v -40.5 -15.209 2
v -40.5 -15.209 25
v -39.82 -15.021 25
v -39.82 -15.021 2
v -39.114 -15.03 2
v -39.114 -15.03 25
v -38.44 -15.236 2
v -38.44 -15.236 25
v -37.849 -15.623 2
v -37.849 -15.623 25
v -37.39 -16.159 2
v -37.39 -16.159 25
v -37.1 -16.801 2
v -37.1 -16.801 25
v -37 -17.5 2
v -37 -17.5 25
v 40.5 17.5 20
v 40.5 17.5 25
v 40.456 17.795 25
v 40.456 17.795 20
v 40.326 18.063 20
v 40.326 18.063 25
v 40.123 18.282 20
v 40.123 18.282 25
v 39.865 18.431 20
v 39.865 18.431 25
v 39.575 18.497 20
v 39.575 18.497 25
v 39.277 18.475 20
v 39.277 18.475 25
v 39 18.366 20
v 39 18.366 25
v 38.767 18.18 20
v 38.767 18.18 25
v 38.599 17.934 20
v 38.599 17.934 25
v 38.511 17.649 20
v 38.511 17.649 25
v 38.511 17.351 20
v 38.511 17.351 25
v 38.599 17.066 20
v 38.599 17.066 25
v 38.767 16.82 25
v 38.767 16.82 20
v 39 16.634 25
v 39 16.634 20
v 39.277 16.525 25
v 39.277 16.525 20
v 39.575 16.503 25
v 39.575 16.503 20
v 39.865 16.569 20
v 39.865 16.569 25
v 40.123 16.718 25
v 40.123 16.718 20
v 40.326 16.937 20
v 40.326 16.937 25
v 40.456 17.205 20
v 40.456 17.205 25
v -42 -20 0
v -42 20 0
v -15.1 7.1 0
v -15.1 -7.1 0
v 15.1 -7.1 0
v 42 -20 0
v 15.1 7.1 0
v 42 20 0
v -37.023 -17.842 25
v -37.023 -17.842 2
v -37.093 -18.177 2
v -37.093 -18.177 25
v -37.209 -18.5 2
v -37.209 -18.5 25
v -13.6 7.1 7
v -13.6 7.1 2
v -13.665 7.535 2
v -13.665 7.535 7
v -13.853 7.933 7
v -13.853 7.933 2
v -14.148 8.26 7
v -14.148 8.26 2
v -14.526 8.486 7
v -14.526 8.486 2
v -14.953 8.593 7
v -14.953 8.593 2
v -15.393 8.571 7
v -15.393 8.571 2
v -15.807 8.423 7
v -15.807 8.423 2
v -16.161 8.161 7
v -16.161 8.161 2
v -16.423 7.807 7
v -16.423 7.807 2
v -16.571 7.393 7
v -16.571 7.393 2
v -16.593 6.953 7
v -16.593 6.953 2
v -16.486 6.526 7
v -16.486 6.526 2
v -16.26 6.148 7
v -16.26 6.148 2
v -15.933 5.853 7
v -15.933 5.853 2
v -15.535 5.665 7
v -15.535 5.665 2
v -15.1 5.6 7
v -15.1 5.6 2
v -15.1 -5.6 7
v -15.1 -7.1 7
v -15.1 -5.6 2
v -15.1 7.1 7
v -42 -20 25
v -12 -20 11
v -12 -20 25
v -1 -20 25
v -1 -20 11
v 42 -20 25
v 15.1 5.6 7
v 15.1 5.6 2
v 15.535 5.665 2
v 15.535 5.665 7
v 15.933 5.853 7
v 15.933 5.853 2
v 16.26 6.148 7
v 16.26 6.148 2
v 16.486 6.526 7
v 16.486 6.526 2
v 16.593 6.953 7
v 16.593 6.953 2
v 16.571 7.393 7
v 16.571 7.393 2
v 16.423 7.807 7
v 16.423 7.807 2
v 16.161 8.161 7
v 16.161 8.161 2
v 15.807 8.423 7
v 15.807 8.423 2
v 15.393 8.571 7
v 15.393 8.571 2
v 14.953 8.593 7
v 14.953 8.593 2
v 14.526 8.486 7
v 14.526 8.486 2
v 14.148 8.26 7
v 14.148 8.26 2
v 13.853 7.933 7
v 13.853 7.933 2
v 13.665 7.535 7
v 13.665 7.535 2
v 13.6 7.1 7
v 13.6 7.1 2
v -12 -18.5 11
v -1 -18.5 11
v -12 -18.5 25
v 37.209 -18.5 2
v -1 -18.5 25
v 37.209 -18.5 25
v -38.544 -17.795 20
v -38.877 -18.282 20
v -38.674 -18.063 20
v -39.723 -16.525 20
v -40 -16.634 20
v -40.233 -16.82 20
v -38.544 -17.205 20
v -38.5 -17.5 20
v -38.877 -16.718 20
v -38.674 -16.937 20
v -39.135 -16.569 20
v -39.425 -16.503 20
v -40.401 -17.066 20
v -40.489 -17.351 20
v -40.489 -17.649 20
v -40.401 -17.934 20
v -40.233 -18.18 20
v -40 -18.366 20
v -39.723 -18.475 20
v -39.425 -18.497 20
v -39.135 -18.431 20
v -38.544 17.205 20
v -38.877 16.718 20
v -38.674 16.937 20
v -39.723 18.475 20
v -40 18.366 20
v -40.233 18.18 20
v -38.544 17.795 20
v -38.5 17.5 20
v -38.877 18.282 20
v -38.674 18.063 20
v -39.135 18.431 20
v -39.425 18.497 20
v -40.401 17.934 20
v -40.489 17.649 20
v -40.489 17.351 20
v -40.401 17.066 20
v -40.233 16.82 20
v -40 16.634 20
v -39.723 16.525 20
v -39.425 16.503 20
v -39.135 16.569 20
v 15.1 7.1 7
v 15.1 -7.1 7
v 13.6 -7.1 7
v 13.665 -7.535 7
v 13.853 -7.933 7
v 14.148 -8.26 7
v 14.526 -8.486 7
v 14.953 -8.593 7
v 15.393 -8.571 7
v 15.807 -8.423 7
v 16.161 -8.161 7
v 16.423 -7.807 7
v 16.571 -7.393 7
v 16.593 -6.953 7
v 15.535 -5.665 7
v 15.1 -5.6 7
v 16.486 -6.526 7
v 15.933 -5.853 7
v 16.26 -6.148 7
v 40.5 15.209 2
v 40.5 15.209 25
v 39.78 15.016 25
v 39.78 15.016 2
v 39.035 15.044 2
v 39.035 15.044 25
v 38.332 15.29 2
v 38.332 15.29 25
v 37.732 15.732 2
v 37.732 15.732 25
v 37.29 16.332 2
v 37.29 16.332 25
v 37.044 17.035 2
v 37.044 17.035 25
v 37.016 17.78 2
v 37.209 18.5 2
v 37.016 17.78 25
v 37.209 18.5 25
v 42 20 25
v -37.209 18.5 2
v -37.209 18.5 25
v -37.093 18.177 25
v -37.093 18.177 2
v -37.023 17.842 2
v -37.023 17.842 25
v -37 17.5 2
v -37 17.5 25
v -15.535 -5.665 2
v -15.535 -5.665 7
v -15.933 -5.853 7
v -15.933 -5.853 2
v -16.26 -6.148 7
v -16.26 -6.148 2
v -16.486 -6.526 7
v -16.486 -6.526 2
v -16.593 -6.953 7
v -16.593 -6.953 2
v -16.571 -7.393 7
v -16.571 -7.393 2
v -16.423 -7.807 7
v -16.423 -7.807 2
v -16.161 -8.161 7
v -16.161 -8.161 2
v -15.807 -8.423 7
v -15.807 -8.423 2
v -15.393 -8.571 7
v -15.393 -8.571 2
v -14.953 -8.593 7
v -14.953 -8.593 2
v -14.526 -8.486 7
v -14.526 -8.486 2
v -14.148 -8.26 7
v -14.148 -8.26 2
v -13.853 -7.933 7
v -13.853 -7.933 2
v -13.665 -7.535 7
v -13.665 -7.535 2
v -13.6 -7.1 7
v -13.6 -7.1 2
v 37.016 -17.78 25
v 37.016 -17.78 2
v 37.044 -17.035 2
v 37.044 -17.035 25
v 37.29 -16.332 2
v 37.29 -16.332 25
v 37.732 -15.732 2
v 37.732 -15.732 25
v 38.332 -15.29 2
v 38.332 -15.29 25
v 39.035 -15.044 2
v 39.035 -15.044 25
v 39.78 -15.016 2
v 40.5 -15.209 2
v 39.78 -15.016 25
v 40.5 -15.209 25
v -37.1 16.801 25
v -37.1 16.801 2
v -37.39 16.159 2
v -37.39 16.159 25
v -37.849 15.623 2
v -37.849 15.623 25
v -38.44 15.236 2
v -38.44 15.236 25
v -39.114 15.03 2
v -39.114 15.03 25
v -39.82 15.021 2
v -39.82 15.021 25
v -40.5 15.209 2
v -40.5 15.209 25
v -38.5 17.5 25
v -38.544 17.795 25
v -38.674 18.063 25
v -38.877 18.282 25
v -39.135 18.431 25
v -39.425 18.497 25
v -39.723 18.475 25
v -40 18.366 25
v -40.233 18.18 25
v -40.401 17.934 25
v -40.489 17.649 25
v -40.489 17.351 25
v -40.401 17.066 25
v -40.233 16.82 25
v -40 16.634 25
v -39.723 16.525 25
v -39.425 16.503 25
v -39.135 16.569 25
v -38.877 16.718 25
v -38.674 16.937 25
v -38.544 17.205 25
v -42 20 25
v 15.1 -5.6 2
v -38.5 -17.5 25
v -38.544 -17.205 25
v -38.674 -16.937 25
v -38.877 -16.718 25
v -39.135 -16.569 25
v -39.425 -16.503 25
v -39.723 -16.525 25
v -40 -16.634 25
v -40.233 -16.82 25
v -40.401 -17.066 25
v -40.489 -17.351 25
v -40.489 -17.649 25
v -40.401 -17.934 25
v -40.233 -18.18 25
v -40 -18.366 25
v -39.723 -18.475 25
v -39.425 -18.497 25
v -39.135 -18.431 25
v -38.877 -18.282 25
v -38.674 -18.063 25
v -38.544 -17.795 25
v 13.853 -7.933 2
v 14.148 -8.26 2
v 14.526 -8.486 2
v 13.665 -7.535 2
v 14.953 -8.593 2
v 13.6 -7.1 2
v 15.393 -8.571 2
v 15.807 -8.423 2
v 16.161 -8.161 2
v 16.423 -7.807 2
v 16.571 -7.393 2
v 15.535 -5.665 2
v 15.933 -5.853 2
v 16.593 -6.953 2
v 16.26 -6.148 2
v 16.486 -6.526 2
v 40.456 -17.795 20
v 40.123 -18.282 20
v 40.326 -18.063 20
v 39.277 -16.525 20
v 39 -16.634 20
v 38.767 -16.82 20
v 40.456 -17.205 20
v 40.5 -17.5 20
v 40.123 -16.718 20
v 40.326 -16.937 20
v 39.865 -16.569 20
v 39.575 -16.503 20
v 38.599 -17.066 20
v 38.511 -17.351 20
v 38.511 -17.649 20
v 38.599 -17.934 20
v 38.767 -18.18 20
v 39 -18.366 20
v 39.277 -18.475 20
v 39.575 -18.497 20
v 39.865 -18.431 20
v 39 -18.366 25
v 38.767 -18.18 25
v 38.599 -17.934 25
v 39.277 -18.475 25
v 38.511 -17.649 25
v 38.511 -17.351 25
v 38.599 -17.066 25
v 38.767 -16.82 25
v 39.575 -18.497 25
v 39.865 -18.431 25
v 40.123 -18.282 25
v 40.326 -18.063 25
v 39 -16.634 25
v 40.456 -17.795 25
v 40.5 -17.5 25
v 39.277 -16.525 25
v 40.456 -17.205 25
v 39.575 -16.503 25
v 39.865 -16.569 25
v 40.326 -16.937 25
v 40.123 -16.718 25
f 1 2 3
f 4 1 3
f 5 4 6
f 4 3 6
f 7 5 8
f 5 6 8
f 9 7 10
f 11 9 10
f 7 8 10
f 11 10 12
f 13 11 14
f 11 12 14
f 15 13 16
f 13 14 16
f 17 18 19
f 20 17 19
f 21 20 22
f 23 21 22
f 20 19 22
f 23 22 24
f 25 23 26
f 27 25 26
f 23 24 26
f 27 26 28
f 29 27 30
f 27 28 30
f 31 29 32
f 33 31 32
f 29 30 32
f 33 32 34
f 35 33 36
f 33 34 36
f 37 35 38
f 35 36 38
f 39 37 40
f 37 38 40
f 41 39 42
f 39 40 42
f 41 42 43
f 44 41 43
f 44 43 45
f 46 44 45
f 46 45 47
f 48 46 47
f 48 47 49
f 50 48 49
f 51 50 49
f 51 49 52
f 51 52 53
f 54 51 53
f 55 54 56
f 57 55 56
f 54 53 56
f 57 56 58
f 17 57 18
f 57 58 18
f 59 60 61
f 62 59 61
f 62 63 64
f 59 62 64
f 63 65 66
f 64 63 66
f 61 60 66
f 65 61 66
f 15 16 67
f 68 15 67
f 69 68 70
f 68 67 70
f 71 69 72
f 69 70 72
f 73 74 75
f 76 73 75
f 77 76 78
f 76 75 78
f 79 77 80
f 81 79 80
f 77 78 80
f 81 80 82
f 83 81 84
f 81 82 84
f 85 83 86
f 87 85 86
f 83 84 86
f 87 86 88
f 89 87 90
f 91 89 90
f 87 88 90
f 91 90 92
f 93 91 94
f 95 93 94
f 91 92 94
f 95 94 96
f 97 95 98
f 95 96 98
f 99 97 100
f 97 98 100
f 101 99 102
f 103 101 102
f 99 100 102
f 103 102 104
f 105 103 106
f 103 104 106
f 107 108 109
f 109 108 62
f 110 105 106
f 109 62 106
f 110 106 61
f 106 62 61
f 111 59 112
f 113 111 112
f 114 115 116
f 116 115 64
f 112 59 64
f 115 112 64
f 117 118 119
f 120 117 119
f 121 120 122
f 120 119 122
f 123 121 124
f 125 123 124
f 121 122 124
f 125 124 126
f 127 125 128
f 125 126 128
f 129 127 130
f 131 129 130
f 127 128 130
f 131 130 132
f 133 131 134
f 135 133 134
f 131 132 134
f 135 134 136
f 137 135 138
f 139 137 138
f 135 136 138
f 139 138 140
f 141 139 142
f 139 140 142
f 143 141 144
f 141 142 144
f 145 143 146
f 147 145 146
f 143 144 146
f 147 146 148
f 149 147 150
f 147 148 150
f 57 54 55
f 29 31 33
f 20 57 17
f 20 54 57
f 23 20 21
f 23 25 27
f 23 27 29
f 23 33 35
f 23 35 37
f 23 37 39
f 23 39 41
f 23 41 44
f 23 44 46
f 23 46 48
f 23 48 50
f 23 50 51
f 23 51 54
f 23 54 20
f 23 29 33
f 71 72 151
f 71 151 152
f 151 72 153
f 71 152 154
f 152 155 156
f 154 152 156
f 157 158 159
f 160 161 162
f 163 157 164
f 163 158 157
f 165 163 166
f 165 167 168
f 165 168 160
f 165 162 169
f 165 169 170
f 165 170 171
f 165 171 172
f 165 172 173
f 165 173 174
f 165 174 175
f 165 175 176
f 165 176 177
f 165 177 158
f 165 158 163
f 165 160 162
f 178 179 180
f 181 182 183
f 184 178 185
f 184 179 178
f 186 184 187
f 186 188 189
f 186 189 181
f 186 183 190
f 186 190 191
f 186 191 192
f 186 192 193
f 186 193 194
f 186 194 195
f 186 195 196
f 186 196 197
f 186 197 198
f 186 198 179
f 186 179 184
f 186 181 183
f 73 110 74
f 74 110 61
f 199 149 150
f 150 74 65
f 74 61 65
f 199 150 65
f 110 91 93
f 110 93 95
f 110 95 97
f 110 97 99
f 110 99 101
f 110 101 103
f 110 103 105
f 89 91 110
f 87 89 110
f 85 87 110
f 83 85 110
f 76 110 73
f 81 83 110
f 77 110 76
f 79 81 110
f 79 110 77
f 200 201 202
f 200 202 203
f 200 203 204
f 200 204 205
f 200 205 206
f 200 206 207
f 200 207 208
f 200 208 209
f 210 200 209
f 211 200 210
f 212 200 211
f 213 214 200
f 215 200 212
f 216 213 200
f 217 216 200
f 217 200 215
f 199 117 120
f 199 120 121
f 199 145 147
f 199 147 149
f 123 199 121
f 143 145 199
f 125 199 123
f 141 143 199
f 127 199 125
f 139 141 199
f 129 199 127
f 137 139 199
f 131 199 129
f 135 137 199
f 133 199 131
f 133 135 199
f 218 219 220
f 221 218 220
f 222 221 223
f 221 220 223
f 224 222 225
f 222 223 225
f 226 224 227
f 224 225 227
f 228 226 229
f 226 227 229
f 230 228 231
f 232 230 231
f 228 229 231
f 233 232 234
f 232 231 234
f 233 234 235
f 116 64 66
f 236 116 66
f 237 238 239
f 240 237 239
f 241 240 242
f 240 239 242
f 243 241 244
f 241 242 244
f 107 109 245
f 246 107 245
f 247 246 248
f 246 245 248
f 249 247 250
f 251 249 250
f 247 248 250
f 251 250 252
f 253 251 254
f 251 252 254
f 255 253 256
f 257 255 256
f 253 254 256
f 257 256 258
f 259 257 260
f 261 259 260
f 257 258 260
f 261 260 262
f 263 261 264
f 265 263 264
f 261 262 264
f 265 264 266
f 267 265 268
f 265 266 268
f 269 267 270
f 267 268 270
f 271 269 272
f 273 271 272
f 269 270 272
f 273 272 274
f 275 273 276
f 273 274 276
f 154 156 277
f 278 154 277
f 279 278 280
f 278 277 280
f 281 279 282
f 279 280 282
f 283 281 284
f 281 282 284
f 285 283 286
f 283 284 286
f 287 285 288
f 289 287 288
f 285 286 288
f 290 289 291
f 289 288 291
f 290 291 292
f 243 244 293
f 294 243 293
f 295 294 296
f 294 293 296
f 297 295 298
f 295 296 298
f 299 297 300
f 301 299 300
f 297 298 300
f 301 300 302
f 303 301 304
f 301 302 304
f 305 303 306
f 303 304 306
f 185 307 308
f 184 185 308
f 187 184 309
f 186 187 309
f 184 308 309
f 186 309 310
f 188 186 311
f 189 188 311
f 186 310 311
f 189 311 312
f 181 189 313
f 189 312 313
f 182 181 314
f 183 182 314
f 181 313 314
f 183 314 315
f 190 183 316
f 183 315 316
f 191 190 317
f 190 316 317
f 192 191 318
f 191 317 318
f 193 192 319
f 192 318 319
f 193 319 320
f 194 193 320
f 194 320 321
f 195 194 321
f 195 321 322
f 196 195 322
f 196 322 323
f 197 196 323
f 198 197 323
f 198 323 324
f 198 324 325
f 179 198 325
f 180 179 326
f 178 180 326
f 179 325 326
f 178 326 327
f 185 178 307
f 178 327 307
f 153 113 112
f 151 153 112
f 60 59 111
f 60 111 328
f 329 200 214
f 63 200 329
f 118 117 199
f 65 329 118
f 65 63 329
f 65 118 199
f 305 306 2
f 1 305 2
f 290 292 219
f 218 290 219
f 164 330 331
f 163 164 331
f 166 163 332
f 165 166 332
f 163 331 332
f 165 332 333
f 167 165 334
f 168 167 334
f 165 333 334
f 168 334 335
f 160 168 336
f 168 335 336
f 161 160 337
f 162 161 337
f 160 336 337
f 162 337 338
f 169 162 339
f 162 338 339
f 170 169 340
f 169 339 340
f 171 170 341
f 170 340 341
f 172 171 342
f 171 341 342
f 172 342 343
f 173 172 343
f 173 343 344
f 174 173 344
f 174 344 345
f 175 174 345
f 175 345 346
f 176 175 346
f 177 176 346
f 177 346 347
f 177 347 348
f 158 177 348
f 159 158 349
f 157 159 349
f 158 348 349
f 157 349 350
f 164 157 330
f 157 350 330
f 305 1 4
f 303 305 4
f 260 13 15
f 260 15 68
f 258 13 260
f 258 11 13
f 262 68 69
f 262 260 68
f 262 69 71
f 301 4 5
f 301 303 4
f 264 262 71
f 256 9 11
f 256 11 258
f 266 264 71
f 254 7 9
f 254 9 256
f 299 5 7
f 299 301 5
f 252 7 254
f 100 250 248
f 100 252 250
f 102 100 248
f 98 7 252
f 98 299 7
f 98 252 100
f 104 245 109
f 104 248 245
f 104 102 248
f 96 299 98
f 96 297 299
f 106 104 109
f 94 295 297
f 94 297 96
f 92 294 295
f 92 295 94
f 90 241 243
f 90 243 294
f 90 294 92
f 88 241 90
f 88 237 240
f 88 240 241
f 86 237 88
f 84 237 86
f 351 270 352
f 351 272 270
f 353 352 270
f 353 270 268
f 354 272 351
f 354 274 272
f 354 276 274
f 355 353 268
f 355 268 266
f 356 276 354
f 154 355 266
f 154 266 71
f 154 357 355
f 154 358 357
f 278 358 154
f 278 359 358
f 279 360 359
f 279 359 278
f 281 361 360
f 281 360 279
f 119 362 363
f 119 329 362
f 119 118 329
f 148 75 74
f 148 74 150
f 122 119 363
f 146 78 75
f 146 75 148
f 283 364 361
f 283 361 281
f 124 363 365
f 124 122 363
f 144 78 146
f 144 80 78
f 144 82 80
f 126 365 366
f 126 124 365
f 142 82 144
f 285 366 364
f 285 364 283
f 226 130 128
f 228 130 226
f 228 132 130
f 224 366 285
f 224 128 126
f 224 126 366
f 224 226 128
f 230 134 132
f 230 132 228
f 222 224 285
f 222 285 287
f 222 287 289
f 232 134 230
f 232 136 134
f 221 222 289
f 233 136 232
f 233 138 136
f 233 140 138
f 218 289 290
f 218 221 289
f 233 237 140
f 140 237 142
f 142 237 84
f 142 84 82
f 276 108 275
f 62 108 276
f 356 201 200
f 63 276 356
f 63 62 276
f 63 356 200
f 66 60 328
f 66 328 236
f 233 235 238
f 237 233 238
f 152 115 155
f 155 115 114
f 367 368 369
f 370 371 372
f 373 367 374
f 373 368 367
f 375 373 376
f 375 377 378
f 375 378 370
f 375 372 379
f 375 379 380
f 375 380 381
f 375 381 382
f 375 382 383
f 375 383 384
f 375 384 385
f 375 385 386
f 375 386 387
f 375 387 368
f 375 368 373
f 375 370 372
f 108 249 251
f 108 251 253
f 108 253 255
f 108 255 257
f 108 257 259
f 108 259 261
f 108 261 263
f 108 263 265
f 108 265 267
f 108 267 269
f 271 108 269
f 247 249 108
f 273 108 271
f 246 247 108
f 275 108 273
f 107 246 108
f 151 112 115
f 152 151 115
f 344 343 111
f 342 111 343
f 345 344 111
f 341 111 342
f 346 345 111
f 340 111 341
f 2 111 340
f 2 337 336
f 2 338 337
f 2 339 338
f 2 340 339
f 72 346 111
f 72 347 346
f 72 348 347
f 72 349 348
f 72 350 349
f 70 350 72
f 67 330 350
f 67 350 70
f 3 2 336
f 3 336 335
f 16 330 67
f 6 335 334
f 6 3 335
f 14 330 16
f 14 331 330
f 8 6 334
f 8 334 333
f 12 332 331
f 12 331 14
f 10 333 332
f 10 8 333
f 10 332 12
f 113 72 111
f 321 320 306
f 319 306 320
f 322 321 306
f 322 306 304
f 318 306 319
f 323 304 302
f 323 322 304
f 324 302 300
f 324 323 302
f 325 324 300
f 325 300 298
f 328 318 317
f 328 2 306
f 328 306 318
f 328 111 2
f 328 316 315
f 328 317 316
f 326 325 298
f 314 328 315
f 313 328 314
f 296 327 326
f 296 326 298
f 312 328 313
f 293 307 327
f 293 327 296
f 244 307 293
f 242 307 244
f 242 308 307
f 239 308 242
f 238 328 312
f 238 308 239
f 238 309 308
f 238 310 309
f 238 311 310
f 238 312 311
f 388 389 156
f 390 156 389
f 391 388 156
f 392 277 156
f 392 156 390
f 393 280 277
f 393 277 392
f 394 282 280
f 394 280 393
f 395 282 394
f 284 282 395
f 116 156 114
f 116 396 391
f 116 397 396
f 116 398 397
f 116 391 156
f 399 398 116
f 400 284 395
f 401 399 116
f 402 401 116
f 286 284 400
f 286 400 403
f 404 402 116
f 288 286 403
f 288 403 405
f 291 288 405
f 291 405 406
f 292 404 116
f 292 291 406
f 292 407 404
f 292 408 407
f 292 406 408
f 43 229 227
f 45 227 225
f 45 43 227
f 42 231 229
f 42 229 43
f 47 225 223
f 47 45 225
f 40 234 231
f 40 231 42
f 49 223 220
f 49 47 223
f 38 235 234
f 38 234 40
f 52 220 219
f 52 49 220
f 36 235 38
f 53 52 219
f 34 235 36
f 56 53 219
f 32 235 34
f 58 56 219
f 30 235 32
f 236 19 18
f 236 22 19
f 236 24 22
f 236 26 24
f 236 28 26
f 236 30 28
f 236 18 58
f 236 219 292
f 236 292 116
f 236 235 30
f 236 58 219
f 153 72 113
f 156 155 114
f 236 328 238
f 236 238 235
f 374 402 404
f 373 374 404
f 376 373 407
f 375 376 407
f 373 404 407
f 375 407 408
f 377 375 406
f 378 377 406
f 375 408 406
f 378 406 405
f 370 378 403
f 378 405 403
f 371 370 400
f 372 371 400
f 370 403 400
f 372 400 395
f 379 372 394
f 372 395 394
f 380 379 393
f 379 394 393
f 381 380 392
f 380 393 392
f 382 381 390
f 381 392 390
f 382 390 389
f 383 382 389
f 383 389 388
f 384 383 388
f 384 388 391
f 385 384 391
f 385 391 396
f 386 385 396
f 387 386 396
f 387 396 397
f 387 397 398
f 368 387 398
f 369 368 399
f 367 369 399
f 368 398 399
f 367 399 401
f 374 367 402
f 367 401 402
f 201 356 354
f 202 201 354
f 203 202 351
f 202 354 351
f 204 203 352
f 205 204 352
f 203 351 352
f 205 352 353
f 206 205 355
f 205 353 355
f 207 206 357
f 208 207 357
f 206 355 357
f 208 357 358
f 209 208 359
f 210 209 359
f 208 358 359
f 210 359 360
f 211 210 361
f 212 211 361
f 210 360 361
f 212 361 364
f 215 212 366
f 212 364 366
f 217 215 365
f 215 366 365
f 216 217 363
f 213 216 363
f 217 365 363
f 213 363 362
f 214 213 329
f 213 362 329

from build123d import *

# Parameters (mm, degrees)
F0_W     = 84
F0_H     = 40
F0_W_2   = 30.2
F0_H_2   = 14.2
F1_DEPTH = 25
F2_W     = 30.2
F2_H     = 14.2
F3_DEPTH = 23
F5_DEPTH = 5
F6_R     = 1
F7_DEPTH = 5
F8_W     = 11
F8_H     = 9
F8_H_2   = 5
F9_DEPTH = 1.5


with BuildPart() as f1:
    # F0 (on Top) → F1 (new body)
    with BuildSketch(Plane.XY):
        Rectangle(F0_W, F0_H)
        Rectangle(F0_W_2, F0_H_2, mode=Mode.SUBTRACT)
    extrude(amount=F1_DEPTH)

    # F2 (on face) → F3 (cut)
    with BuildSketch(Plane.XY.offset(25)):
        with BuildLine():
            Line((-37.2087121525, -18.5), (37.2087121525, -18.5))
            ThreePointArc((37.2087121525, -18.5), (37.732233047, -15.732233047), (40.5, -15.2087121525))
            Line((40.5, -15.2087121525), (40.5, 15.2087121525))
            ThreePointArc((40.5, 15.2087121525), (37.732233047, 15.732233047), (37.2087121525, 18.5))
            Line((37.2087121525, 18.5), (-37.2087121525, 18.5))
            ThreePointArc((-37.2087121525, 18.5), (-37.0527342177, 18.0107741092), (-37, 17.5))
            ThreePointArc((-37, 17.5), (-38.1306936062, 15.4083499337), (-40.5, 15.2087121525))
            Line((-40.5, 15.2087121525), (-40.5, -15.2087121525))
            ThreePointArc((-40.5, -15.2087121525), (-38.1306936062, -15.4083499337), (-37, -17.5))
            ThreePointArc((-37, -17.5), (-37.0527342177, -18.0107741092), (-37.2087121525, -18.5))
        make_face()
        Rectangle(F2_W, F2_H, mode=Mode.SUBTRACT)
    extrude(amount=-F3_DEPTH, mode=Mode.SUBTRACT)

    # F4 (on face) → F5 (join)
    with BuildSketch(Plane.XY.offset(2)):
        with BuildLine():
            Line((-15.1, 7.1), (-13.6, 7.1))
            ThreePointArc((-13.6, 7.1), (-16.1606601718, 8.1606601718), (-15.1, 5.6))
            Line((-15.1, 5.6), (-15.1, 7.1))
        make_face()
        with BuildLine():
            Line((-15.1, -7.1), (-15.1, -5.6))
            ThreePointArc((-15.1, -5.6), (-16.1606601718, -8.1606601718), (-13.6, -7.1))
            Line((-13.6, -7.1), (-15.1, -7.1))
        make_face()
        with BuildLine():
            ThreePointArc((13.6, -7.1), (16.1606601718, -8.1606601718), (15.1, -5.6))
            Line((15.1, -5.6), (15.1, -7.1))
            Line((15.1, -7.1), (13.6, -7.1))
        make_face()
        with BuildLine():
            ThreePointArc((15.1, 5.6), (16.1606601718, 8.1606601718), (13.6, 7.1))
            Line((13.6, 7.1), (15.1, 7.1))
            Line((15.1, 7.1), (15.1, 5.6))
        make_face()
    extrude(amount=F5_DEPTH)

    # F6 (on face) → F7 (cut)
    with BuildSketch(Plane.XY.offset(25)):
        with Locations((-39.5, 17.5)):
            Circle(F6_R)
        with Locations((39.5, 17.5)):
            Circle(F6_R)
        with Locations((39.5, -17.5)):
            Circle(F6_R)
        with Locations((-39.5, -17.5)):
            Circle(F6_R)
    extrude(amount=-F7_DEPTH, mode=Mode.SUBTRACT)

    # F8 (on face) → F9 (cut, through all)
    with BuildSketch(Plane.XZ.offset(20)):
        with Locations((-6.5, 15.5)):
            Rectangle(F8_W, F8_H)
        with Locations((-6.5, 22.5)):
            Rectangle(F8_W, F8_H_2)
    extrude(amount=-F9_DEPTH, mode=Mode.SUBTRACT)


solid = f1.part
